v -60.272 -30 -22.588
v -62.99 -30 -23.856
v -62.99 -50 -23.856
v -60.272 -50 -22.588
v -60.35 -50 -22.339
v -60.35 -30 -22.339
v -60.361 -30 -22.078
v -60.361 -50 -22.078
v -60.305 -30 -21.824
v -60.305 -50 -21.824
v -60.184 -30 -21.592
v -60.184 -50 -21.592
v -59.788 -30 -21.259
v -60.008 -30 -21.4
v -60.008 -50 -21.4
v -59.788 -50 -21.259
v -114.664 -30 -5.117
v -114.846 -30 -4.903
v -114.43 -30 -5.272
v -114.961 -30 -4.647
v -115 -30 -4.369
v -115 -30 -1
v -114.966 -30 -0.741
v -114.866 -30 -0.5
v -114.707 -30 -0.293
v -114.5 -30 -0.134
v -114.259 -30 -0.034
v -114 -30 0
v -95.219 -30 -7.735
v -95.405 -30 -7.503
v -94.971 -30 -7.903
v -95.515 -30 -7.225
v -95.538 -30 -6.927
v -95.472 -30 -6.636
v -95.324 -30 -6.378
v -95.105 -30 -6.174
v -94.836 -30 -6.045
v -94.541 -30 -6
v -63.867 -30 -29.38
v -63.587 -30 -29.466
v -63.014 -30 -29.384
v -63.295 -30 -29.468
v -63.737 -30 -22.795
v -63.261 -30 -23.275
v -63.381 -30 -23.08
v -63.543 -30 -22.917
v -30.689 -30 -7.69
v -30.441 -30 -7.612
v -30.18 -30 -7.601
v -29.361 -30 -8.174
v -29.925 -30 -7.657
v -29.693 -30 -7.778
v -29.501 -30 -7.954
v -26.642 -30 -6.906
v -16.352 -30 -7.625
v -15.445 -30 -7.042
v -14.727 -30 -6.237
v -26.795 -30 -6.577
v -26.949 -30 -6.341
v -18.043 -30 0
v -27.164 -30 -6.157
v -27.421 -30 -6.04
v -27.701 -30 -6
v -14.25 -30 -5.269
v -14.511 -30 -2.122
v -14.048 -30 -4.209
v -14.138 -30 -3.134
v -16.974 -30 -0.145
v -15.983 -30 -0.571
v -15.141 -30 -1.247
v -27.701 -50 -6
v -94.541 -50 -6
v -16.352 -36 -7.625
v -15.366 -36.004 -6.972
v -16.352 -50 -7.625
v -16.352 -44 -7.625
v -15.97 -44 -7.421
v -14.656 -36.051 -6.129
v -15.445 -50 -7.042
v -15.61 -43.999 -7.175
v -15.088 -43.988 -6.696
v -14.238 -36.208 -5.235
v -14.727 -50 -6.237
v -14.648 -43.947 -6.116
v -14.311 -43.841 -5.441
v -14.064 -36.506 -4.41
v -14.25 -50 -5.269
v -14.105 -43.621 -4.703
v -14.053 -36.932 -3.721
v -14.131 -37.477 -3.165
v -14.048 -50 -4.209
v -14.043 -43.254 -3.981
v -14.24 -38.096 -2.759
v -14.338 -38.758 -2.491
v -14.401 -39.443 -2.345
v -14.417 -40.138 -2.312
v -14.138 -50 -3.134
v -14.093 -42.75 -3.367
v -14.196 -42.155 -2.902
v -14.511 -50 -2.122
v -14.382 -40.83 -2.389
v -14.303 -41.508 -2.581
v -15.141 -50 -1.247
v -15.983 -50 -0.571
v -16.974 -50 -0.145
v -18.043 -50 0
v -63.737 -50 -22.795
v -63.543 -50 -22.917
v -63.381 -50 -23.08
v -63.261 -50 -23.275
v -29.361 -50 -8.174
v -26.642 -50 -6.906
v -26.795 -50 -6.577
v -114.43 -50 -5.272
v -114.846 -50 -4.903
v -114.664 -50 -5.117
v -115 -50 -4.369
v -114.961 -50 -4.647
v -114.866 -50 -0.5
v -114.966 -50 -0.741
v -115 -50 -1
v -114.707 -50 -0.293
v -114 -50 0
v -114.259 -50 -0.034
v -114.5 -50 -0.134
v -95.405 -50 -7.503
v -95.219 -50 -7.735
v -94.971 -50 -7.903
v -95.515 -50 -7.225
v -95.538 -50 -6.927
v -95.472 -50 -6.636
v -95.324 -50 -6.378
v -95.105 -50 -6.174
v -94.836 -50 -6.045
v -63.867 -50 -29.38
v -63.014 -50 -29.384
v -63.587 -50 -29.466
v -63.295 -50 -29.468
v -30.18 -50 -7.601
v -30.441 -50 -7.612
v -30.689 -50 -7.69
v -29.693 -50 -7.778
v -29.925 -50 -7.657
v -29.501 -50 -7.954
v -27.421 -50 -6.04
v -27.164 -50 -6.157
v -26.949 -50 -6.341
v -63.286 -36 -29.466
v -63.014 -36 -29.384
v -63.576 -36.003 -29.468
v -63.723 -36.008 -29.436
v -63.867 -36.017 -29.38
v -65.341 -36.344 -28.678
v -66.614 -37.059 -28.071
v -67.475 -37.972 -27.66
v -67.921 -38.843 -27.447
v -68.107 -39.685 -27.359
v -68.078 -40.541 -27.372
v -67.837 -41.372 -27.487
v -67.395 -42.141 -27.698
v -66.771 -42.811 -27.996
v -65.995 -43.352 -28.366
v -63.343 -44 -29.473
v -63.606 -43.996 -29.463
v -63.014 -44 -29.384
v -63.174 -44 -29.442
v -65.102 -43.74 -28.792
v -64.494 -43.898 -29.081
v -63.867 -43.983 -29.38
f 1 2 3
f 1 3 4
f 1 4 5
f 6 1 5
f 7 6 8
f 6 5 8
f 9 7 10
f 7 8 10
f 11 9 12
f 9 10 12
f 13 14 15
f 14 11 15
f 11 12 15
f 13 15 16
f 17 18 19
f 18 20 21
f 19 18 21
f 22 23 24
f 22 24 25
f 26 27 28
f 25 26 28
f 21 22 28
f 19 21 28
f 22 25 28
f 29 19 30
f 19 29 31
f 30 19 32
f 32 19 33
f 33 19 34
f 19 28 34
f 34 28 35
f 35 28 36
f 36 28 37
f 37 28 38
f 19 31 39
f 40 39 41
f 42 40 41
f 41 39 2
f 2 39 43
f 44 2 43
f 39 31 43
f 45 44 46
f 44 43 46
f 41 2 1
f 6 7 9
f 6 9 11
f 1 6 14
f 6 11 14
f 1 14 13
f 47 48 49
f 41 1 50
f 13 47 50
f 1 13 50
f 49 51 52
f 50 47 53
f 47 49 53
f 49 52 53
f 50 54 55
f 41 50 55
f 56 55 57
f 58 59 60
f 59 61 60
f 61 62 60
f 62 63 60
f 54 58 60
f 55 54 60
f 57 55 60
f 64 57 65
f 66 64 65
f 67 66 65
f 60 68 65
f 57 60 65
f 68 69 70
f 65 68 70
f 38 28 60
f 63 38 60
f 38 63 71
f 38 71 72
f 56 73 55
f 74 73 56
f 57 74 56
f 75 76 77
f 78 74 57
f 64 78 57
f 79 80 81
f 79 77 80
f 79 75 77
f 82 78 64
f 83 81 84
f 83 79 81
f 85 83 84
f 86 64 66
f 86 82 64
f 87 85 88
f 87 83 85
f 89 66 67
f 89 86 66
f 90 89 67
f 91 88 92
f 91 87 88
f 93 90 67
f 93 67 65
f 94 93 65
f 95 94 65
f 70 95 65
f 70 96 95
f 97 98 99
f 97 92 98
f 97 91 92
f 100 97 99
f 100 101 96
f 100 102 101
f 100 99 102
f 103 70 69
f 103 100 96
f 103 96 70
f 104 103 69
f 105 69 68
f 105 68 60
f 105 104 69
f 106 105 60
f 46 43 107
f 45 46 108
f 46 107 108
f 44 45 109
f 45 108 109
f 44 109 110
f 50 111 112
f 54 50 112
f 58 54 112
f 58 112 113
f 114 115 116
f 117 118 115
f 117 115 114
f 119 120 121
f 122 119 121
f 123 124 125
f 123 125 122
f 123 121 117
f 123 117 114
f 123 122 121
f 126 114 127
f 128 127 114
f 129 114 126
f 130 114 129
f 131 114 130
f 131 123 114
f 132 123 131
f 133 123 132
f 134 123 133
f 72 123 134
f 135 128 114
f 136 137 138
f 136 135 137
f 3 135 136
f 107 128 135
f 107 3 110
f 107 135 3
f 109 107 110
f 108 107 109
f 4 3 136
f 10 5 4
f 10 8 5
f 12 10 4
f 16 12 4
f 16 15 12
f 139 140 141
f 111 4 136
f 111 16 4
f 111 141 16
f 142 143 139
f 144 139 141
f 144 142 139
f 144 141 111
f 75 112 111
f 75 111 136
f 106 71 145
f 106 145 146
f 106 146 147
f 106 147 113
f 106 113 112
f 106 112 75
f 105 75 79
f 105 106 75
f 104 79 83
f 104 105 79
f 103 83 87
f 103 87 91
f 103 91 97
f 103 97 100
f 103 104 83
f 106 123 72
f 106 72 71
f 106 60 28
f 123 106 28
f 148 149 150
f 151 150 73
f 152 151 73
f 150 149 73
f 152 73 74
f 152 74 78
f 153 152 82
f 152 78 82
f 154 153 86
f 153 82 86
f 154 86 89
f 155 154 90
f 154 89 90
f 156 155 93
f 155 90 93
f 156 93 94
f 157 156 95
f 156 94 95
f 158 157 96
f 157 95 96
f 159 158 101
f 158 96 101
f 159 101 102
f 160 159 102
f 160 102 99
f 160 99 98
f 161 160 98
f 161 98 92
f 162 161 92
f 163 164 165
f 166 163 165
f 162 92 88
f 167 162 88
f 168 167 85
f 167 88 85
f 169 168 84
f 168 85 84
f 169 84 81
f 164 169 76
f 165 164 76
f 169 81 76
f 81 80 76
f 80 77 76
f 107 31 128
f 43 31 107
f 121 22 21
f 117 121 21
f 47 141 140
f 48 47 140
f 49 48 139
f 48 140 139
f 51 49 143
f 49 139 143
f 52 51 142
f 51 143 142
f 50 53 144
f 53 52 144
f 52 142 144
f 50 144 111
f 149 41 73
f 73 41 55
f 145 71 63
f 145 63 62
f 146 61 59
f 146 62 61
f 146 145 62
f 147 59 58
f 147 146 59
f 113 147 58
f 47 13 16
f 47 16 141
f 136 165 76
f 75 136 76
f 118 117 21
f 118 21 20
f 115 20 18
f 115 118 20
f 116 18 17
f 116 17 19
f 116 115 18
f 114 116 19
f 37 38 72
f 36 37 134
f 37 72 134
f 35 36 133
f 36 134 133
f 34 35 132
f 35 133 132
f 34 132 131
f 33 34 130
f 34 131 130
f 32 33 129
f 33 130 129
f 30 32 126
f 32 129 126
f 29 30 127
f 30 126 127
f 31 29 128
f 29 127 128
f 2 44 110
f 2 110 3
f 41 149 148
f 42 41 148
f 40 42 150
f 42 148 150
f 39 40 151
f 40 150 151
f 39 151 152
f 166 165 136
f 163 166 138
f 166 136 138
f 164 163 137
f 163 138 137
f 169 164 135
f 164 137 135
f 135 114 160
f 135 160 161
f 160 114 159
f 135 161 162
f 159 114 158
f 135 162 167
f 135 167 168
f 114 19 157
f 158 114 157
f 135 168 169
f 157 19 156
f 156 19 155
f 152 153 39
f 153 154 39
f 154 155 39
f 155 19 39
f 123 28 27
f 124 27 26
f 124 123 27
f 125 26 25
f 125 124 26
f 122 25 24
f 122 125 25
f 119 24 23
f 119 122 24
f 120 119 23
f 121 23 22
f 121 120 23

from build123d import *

# Parameters (mm, degrees)
F1_DEPTH  = 50
F3_R      = 1
F4_R      = 4
F5_R      = 4
F6_DEPTH  = 116.6842043143
F8_DEPTH  = 50.0010001
F9_R      = 0.99999
F10_DEPTH = 30


# Not quite as in the source:
# - a fillet or chamfer is up to 0.001 mm smaller than in the source, because OpenCascade refuses the exact size


with BuildPart() as f1:
    # F0 (on Front) → F1 (new body)
    with BuildSketch(Plane.XZ):
        Polygon((-63.4415450926, -29.5832783218), (0, 0), (-115, 0), (-115, -5), align=None)
    extrude(amount=F1_DEPTH)

    # F3
    f3_edges = [f1.edges().sort_by_distance(p)[0] for p in [
        (-63.441545, -25, -29.583278),
        (-115, -25, -5),
        (-115, -25, 0),
    ]]
    fillet(f3_edges, radius=F3_R)

    # F4
    f4_edges = [f1.edges().sort_by_distance(p)[0] for p in [
        (0, -25, 0),
    ]]
    fillet(f4_edges, radius=F4_R)

    # F5 (on face) → F6 (cut, through all)
    with BuildSketch(Plane(origin=(0, 0, 0), x_dir=(0, 1, 0), z_dir=(0.906307787, 0, 0.4226182617))):
        with Locations((-40, 0)):
            Circle(F5_R)
    extrude(amount=-F6_DEPTH, mode=Mode.SUBTRACT)

    # F7 (on Front) → F8 (cut, through all)
    with BuildSketch(Plane.XZ):
        Polygon((-27.064251022, -6), (-98.9616948614, -6), (-63.4130640807, -22.9497298941), (-62.990445819, -23.8560376812), (-60.2715224579, -22.588182896), (-60.6941407196, -21.6818751089), (-29.7831743831, -7.2678547852), (-29.3605561213, -8.1741625723), (-26.6416327602, -6.906307787), align=None)
    extrude(amount=F8_DEPTH, mode=Mode.SUBTRACT)

    # F9 (radius 1 in the source; OpenCascade refuses exactly that, so slightly less here)
    f9_edges = [f1.edges().sort_by_distance(p)[0] for p in [
        (-98.961695, -25, -6),
        (-60.694141, -25, -21.681875),
        (-29.783174, -25, -7.267855),
        (-27.064251, -25, -6),
        (-63.413064, -25, -22.94973),
    ]]
    fillet(f9_edges, radius=F9_R)

    # F0 (on Front) → F10 (cut)
    with BuildSketch(Plane.XZ):
        Polygon((-63.4415450926, -29.5832783218), (0, 0), (-115, 0), (-115, -5), align=None)
    extrude(amount=F10_DEPTH, mode=Mode.SUBTRACT)


solid = f1.part
